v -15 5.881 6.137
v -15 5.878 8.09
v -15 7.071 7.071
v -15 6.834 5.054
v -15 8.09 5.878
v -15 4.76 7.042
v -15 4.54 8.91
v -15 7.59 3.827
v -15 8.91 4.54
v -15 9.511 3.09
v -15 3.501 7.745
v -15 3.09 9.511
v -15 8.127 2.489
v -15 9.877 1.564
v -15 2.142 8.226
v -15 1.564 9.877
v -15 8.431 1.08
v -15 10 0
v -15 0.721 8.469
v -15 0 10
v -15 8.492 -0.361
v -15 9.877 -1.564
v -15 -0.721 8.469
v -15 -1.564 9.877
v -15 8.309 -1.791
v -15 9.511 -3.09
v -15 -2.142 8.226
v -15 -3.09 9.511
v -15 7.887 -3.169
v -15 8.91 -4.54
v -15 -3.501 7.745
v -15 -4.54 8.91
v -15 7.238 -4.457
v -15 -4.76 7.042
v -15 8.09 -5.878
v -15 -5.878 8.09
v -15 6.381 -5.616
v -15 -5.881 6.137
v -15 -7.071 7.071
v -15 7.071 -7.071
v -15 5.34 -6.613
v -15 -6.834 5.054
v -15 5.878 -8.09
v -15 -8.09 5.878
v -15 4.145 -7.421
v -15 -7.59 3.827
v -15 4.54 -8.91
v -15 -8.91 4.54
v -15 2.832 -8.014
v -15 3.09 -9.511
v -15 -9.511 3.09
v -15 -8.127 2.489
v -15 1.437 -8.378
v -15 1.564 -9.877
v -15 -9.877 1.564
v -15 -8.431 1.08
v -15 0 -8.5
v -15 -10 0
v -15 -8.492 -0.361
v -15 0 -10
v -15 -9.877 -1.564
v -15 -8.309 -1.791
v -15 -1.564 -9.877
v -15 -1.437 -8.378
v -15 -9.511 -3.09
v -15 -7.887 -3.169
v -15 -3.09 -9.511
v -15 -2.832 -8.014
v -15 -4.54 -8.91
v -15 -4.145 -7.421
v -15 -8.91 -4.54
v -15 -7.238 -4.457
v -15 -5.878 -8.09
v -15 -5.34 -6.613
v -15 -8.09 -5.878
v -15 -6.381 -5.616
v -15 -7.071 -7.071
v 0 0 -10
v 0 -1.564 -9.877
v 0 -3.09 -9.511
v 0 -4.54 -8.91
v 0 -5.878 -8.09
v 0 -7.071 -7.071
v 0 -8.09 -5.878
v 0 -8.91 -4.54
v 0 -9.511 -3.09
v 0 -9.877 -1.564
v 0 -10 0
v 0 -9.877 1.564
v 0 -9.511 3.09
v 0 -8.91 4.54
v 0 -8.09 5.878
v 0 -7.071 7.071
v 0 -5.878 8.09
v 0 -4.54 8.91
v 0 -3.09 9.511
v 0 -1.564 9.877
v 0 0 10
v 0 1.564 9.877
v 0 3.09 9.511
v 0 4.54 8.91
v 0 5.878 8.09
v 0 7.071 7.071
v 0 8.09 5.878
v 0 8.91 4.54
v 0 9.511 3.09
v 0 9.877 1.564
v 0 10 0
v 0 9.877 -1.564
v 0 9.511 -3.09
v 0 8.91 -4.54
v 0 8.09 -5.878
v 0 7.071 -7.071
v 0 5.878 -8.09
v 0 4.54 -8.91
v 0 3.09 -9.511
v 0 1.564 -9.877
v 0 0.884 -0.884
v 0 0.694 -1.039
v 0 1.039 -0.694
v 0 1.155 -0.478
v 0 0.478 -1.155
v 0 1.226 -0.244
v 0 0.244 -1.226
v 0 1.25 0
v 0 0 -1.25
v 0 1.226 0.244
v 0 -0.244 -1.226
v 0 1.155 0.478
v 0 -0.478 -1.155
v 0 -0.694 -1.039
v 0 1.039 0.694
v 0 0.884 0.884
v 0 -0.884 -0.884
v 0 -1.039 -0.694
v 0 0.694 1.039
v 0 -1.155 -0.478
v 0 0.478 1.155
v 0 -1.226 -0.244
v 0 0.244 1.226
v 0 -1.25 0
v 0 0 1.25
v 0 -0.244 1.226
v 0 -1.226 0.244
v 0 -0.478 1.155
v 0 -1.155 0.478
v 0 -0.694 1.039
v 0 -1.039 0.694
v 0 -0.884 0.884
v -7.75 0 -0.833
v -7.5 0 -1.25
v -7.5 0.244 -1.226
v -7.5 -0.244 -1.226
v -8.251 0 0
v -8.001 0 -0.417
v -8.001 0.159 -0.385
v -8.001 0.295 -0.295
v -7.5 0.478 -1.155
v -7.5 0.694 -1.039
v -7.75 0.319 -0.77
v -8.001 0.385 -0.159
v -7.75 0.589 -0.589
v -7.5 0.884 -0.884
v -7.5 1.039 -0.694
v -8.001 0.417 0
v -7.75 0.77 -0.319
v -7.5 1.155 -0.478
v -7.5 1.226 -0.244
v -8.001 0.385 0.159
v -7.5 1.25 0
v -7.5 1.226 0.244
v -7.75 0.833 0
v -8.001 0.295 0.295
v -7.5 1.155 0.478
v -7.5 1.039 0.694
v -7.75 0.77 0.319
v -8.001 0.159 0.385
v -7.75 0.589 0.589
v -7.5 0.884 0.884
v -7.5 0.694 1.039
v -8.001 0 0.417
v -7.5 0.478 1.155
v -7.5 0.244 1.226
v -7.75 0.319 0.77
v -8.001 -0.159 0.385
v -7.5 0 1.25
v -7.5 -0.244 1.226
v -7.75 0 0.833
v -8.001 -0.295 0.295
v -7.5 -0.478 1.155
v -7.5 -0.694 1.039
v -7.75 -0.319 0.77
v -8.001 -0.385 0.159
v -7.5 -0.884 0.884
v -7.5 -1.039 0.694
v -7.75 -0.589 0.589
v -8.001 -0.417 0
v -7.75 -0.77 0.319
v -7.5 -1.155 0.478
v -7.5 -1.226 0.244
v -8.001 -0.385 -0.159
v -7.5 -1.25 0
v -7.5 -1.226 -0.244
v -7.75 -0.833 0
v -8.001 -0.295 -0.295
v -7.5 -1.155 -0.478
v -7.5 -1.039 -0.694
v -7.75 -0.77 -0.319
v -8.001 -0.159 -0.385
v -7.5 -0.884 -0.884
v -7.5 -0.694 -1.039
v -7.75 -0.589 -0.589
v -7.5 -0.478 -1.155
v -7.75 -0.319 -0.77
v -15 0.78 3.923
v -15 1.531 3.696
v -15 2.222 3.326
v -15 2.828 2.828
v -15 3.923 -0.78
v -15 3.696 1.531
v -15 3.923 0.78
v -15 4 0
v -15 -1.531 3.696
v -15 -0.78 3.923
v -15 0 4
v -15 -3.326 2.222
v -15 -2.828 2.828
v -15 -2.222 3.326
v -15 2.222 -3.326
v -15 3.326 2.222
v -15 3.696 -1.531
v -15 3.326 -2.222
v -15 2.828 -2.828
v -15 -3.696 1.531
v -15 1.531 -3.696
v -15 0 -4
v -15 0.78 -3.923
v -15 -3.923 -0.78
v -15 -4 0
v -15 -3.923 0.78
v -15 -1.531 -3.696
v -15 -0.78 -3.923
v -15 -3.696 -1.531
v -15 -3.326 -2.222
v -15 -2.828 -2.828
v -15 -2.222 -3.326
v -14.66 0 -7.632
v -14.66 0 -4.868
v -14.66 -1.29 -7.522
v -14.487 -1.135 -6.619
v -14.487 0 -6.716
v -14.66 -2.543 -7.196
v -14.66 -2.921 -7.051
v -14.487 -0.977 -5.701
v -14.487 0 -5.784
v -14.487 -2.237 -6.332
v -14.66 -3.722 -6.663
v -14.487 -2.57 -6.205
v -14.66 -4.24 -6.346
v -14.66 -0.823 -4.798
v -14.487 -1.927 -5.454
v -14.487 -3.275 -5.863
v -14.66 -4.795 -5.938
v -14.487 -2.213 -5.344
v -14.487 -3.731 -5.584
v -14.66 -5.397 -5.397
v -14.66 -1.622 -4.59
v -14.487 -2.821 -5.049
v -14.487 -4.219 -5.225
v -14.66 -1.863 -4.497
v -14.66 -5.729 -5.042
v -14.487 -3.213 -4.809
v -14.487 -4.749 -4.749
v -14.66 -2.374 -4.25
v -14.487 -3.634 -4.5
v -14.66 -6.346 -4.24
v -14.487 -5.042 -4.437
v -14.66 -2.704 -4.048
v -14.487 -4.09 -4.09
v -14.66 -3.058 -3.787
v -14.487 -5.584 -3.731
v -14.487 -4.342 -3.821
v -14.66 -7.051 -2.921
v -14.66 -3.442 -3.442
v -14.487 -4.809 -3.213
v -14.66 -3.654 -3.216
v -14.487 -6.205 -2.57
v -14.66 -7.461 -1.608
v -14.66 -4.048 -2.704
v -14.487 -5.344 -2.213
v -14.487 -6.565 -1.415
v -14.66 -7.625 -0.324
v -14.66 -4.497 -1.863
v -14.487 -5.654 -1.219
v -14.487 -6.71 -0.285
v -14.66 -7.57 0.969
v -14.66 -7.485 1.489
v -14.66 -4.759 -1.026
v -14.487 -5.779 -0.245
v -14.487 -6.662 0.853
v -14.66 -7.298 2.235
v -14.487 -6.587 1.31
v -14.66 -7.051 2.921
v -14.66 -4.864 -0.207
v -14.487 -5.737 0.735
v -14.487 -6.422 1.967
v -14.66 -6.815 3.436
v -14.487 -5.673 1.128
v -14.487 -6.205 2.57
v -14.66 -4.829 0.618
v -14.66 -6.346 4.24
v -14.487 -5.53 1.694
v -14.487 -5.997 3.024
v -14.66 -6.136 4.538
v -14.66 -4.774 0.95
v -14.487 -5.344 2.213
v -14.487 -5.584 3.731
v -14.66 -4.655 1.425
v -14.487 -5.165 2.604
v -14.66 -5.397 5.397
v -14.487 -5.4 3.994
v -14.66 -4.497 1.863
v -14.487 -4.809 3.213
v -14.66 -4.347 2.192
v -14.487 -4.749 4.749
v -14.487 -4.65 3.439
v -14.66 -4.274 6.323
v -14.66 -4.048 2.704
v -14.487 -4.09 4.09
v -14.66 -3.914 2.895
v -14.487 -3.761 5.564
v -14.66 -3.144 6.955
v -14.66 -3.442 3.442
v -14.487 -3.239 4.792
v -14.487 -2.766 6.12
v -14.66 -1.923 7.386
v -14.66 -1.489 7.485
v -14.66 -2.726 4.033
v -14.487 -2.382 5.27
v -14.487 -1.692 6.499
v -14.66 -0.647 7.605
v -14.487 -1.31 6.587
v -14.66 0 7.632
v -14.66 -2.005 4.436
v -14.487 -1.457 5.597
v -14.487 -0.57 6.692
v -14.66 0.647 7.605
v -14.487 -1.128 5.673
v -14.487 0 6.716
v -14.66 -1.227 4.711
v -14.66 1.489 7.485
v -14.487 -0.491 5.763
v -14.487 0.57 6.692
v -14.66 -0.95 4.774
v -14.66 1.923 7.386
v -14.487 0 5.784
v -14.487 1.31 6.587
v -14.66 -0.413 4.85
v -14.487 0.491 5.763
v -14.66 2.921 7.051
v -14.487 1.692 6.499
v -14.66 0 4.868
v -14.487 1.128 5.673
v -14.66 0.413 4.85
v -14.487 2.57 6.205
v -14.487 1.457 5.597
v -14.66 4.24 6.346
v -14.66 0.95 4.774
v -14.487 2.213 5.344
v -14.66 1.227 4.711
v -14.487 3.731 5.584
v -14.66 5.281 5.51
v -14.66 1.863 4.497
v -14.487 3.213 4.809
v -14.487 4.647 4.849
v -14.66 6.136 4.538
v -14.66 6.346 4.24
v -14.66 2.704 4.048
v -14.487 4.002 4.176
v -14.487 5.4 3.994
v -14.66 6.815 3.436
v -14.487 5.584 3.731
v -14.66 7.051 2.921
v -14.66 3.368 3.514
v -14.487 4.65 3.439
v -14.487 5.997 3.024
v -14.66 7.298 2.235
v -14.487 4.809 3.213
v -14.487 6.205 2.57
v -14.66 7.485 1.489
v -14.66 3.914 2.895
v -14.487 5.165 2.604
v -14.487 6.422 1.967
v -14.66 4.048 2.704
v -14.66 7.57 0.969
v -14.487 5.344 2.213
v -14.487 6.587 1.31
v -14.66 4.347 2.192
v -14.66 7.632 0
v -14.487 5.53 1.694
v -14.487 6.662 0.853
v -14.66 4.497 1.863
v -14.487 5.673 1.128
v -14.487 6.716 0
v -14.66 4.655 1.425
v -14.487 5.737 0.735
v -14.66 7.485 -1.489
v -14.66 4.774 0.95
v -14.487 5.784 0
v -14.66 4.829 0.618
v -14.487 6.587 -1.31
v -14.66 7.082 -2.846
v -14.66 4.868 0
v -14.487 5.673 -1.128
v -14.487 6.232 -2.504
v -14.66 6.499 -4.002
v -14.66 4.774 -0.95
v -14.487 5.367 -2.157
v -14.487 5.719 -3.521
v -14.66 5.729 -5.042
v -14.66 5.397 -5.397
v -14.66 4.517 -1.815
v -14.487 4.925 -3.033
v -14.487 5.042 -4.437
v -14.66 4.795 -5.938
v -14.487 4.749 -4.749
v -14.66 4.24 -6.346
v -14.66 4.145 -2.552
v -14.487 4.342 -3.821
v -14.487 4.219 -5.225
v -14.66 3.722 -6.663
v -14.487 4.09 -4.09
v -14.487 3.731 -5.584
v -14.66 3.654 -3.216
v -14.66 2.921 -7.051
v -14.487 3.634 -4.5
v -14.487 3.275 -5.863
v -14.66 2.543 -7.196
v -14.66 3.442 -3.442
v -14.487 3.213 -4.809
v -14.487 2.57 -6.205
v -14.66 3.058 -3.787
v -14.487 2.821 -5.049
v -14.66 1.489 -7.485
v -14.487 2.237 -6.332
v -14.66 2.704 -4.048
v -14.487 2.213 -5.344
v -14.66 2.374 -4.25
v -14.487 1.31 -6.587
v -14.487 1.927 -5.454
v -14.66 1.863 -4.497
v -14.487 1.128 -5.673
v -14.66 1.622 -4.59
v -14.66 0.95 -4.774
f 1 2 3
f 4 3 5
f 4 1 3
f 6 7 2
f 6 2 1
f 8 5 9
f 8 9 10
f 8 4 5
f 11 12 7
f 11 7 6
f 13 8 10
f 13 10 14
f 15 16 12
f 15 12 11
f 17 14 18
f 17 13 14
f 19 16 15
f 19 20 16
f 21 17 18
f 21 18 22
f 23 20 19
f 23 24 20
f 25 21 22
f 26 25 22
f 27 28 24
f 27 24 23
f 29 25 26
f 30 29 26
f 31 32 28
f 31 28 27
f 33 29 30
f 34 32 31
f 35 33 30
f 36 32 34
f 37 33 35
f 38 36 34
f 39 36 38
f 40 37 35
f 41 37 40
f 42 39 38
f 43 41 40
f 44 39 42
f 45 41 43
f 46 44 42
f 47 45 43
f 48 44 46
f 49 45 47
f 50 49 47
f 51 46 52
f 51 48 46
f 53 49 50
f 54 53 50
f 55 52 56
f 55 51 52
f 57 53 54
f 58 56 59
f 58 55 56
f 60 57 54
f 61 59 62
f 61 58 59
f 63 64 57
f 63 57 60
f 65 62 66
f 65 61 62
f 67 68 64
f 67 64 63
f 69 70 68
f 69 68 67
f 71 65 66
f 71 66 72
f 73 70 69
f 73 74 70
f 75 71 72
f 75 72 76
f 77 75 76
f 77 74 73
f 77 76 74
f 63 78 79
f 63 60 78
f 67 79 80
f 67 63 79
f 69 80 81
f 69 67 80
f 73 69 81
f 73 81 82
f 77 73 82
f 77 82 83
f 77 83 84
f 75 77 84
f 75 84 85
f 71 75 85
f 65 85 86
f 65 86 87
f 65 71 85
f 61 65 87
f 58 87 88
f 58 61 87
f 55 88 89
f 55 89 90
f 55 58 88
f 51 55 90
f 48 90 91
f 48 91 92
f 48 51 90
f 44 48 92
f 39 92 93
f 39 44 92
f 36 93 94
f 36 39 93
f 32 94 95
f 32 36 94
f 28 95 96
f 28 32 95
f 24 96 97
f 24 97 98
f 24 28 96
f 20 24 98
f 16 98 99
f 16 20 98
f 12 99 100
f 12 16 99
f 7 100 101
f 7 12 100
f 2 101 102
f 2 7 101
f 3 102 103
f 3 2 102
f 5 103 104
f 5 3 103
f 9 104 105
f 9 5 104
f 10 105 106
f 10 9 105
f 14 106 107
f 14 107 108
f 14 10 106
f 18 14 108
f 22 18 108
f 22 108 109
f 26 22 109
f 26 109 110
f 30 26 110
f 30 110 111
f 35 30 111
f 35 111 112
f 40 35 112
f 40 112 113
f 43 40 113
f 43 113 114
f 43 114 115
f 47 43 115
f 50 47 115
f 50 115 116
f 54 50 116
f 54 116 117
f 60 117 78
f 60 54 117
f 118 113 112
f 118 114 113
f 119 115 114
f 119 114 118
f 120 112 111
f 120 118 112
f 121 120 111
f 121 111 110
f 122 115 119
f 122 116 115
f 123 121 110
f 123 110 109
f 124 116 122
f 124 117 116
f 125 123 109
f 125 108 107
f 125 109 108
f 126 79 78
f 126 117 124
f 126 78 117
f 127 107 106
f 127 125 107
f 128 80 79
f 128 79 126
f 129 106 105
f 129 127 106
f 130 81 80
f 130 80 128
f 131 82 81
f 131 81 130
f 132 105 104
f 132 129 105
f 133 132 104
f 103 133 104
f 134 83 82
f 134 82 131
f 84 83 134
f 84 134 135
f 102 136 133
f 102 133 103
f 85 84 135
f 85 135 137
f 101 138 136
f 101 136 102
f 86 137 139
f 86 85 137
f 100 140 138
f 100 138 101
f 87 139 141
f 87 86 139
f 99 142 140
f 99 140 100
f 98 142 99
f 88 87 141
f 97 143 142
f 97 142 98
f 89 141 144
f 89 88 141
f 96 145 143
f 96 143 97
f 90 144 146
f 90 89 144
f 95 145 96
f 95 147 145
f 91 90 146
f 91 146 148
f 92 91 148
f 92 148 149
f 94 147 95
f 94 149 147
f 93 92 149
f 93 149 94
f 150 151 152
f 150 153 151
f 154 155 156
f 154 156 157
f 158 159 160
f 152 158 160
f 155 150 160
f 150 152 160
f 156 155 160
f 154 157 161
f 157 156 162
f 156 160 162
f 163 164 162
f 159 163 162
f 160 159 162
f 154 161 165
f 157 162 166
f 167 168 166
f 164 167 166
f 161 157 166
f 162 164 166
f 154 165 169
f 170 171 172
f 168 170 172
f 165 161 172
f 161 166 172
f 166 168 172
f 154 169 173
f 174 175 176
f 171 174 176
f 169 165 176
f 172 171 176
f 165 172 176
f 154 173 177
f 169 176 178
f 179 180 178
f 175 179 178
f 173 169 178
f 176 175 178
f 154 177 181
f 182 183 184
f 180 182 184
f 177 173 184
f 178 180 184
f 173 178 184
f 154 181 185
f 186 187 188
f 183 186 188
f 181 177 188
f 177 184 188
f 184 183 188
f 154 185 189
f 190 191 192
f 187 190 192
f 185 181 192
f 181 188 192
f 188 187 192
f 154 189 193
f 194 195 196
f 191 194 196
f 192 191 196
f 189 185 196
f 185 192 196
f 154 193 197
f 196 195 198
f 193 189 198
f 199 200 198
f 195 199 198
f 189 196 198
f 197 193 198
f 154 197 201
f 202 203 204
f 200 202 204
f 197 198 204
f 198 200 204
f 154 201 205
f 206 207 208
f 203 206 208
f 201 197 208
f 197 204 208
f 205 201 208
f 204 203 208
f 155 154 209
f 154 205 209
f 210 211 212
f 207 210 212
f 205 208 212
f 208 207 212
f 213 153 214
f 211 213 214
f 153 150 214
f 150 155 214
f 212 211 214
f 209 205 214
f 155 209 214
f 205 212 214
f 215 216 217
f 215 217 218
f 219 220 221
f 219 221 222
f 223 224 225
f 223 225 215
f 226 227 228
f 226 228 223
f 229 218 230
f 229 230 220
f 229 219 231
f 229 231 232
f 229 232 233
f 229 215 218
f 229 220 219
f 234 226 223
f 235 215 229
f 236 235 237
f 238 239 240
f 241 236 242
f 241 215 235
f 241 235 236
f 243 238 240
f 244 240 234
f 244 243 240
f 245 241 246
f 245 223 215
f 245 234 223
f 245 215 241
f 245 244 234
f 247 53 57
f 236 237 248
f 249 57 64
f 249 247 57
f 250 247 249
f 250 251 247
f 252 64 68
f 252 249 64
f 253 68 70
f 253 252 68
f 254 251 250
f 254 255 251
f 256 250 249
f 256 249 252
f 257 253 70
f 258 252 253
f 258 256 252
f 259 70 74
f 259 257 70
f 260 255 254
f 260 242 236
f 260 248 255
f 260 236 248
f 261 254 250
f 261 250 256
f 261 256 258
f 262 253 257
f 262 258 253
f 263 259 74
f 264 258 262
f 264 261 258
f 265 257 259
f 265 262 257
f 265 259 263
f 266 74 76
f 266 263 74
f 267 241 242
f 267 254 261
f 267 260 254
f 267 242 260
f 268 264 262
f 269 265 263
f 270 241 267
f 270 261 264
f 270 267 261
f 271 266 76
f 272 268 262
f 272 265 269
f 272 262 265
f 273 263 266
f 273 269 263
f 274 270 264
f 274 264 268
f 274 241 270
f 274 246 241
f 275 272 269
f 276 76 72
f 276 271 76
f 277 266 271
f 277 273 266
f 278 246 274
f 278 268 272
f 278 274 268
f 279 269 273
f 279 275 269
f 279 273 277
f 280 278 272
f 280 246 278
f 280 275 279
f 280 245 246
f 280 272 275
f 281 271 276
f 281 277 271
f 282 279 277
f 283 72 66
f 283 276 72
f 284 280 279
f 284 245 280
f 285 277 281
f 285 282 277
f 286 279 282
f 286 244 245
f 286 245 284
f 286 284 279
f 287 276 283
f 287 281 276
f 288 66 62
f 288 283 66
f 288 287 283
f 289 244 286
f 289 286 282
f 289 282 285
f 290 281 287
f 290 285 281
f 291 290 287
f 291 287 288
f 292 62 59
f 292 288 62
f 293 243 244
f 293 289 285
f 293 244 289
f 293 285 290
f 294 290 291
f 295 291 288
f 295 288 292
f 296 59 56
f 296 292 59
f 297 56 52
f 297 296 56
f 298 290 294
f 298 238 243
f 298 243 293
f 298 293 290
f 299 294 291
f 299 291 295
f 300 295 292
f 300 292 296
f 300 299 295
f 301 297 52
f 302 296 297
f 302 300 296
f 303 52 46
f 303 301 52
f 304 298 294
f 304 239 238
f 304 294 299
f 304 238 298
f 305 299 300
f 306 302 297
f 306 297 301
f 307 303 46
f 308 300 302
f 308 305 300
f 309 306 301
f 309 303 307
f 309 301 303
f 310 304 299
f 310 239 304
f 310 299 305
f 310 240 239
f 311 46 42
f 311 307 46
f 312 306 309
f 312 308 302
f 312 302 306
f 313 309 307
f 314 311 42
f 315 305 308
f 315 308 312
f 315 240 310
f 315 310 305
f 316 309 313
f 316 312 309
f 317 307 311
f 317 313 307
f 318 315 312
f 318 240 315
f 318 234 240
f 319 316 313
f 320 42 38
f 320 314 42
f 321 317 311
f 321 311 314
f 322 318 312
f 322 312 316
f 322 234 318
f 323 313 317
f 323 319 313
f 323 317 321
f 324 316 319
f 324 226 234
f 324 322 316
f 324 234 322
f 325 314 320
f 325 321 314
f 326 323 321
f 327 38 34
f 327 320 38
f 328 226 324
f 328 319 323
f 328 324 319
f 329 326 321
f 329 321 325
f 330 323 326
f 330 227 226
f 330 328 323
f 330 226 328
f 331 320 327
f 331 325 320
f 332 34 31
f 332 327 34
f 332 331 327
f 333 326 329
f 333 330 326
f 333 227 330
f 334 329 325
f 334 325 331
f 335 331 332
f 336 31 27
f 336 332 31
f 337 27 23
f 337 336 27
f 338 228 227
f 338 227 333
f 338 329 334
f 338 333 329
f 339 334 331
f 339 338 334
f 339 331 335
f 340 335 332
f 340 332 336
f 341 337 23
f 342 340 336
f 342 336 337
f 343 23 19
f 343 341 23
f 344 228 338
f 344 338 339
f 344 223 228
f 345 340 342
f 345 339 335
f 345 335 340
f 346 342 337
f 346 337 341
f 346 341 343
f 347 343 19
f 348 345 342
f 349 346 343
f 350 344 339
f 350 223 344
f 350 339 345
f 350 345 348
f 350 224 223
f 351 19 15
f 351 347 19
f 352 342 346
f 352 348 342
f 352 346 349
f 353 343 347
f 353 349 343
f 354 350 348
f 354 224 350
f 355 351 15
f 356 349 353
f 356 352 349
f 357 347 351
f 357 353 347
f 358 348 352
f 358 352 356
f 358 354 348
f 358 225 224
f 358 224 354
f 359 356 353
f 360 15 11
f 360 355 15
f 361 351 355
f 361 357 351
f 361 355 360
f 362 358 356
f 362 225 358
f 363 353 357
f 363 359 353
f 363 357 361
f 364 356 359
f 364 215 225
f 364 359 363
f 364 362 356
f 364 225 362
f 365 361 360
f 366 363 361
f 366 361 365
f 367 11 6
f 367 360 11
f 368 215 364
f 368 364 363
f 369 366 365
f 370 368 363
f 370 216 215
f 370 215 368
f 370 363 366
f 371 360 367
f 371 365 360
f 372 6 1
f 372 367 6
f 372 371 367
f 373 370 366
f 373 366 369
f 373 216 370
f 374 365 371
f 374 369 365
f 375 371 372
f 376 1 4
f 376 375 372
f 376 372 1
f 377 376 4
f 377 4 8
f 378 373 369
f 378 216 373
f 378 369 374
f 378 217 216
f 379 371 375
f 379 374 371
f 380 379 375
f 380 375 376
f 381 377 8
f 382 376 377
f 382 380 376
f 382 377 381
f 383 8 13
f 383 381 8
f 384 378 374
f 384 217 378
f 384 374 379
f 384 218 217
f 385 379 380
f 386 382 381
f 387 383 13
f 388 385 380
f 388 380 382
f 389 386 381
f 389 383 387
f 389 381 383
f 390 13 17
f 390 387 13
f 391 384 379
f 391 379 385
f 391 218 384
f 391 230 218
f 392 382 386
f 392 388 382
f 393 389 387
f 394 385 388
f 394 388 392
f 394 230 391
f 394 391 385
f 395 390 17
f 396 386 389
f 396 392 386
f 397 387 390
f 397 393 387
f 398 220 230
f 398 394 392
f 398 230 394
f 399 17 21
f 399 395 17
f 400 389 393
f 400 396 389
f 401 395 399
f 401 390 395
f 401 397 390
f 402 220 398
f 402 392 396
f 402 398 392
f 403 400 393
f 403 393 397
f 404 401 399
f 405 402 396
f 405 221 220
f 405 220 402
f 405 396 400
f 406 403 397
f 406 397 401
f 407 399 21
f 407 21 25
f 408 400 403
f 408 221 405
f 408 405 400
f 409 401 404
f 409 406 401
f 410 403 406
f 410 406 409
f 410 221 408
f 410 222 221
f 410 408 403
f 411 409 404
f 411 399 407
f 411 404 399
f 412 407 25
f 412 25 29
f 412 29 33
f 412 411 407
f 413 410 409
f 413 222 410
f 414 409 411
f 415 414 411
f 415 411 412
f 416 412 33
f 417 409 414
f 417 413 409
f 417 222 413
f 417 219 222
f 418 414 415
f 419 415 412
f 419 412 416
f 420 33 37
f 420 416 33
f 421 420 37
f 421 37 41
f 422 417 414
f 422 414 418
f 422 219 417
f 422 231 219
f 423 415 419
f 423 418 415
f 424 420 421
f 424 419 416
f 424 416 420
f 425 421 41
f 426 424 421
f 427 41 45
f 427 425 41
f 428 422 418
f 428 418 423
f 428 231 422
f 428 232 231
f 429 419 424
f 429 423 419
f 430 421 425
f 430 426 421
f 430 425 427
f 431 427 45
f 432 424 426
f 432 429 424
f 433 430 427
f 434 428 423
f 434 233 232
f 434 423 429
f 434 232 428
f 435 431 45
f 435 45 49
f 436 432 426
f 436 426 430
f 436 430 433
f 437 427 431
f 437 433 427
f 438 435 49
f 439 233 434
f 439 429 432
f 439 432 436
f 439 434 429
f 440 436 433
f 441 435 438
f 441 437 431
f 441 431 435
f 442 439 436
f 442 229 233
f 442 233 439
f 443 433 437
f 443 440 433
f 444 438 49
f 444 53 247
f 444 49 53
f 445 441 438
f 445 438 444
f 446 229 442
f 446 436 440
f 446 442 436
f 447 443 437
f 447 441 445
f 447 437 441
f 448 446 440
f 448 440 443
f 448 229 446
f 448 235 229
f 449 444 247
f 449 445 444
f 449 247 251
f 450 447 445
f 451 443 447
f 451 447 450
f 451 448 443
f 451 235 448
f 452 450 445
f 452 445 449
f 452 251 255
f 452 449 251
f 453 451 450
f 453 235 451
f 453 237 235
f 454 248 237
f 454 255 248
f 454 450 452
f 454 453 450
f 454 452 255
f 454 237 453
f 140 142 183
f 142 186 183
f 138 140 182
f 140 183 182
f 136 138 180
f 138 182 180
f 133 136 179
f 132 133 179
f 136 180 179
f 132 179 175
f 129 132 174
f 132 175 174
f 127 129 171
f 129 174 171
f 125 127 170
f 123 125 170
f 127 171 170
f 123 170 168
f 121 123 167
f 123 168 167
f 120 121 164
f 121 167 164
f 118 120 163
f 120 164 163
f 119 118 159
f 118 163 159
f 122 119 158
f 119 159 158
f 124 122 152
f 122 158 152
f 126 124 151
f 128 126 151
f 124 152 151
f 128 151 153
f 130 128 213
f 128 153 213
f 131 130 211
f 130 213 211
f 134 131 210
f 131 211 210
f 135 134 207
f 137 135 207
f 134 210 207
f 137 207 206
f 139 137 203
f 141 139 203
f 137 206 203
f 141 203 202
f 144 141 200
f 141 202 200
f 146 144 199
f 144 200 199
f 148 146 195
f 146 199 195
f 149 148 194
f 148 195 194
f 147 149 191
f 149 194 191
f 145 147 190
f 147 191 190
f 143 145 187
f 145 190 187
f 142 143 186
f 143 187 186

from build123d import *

# Parameters (mm, degrees)
M3_TAPPED_HOLE1_D     = 2.5
M3_TAPPED_HOLE1_DEPTH = 7.5
M3_TAPPED_HOLE1_TIP   = 0.751075774


with BuildPart() as part:
    # Sketch1 → Revolve1 (revolve)
    with BuildSketch(Plane.XY, mode=Mode.PRIVATE) as revolve1_sk:
        with BuildLine():
            Line((0, 0), (0, 10))
            Line((0, 10), (-15, 10))
            Line((-15, 10), (-15, 8.5))
            ThreePointArc((-15, 8.5), (-14.465142775, 6.25), (-15, 4))
            Line((-15, 4), (-15, 0))
            Line((-15, 0), (0, 0))
        make_face()
    revolve(revolve1_sk.sketch.rotate(Axis((0, 0, 0), (-1, 0, 0)), 90), axis=Axis((0, 0, 0), (-1, 0, 0)))

    # M3 Tapped Hole1
    with Locations(Plane(origin=(0, 0, 0), x_dir=(0, 0, -1), z_dir=(1, 0, 0))):
        with Locations((0, 0)):
            Hole(M3_TAPPED_HOLE1_D / 2, depth=M3_TAPPED_HOLE1_DEPTH)
            with Locations((0, 0, -(M3_TAPPED_HOLE1_DEPTH + M3_TAPPED_HOLE1_TIP / 2))):  # 118° drill point
                Cone(0, M3_TAPPED_HOLE1_D / 2, M3_TAPPED_HOLE1_TIP, mode=Mode.SUBTRACT)


solid = part.part
